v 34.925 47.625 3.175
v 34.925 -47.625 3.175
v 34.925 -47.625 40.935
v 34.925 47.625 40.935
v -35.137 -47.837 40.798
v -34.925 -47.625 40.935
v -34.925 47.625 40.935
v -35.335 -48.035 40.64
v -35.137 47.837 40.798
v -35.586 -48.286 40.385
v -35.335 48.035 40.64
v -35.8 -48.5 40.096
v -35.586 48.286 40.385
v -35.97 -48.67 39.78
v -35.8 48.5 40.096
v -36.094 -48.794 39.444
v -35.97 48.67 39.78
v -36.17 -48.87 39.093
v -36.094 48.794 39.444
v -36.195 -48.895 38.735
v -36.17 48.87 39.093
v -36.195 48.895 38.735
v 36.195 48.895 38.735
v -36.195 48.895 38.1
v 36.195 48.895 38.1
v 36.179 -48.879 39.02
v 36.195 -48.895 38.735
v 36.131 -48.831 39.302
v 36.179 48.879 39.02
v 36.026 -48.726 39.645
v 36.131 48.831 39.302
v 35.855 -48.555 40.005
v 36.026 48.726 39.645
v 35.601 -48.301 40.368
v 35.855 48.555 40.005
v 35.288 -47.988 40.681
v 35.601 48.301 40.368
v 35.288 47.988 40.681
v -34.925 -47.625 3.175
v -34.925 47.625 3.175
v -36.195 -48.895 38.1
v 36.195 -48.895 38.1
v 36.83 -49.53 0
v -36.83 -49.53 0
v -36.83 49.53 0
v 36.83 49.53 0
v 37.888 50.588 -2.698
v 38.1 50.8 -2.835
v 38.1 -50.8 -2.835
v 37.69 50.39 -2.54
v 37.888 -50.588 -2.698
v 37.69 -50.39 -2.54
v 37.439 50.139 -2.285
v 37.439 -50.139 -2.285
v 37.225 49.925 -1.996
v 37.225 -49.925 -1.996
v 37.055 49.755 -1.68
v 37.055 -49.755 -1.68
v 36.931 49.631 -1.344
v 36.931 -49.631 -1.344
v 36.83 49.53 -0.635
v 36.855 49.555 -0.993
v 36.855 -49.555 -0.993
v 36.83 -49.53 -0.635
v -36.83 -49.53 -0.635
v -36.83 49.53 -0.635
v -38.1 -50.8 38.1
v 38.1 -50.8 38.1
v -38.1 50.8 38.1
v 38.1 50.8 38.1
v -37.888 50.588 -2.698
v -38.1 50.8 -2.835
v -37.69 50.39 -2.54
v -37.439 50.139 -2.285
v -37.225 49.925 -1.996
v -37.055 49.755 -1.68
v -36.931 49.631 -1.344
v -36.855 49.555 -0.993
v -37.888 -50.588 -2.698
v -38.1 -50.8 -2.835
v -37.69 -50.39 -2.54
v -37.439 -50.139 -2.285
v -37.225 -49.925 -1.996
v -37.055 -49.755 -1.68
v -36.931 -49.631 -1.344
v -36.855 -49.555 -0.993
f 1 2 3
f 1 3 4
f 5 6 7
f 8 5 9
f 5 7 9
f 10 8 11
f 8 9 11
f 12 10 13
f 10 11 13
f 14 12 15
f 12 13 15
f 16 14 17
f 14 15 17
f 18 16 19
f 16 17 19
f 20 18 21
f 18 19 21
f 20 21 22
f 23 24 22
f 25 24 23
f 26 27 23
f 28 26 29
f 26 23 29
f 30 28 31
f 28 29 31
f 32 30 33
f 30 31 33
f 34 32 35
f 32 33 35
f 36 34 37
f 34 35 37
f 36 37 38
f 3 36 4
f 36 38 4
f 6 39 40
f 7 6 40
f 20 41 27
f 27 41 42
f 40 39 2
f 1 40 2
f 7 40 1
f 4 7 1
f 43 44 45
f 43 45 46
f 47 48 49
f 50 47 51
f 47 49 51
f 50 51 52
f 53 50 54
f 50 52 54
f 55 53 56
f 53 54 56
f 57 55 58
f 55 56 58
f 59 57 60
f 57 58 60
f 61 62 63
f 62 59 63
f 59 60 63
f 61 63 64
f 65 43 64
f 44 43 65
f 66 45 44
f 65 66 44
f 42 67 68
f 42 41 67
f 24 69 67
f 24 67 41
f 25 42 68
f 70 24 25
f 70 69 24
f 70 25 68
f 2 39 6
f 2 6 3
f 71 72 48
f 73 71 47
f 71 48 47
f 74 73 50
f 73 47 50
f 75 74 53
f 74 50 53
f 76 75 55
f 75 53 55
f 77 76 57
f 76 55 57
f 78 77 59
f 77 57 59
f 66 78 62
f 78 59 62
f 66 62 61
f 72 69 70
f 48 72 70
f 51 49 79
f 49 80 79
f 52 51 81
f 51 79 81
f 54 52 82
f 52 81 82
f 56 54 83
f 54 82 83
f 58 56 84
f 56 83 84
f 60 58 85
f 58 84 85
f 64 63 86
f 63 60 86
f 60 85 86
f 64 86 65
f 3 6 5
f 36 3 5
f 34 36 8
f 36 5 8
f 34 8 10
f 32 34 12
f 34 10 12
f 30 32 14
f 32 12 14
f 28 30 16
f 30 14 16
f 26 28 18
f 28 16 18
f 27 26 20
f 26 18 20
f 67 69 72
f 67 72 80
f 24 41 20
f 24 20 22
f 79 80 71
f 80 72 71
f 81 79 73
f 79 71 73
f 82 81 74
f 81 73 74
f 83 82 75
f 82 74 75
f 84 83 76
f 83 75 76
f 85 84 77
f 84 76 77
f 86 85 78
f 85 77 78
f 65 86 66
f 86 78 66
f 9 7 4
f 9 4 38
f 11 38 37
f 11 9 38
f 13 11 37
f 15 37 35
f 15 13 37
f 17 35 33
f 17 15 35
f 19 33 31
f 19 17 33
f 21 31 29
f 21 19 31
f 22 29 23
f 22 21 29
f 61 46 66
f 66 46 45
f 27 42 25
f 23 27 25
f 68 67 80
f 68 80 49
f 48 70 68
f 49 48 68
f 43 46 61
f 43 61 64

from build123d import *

# Parameters (mm, degrees)
F0_W         = 76.2
F0_H         = 101.6
F1_DEPTH     = 38.1
F2_W         = 69.85
F2_H         = 95.25
F3_DEPTH     = 34.925
F4_W         = 72.39
F4_H         = 97.79
F4_W_2       = 69.85
F4_H_2       = 95.25
F5_DEPTH     = 3.175
F6_W         = 76.2
F6_H         = 101.6
F6_W_2       = 73.66
F6_H_2       = 99.06
F7_DEPTH     = 3.175
F8_T1_DEPTH  = 110.49
F8_T3_DEPTH  = 85.09
F8_T5_DEPTH  = 99.06
F8_T7_DEPTH  = 73.66
F8_T13_DEPTH = 105.41
F8_T19_DEPTH = 80.01
F8_T28_DEPTH = 105.41
F8_T34_DEPTH = 80.01
F8_T43_DEPTH = 80.01
F8_T49_DEPTH = 105.41
F8_T58_DEPTH = 105.41
F8_T64_DEPTH = 80.01


# Not quite as in the source:
# - a fillet or chamfer that OpenCascade refuses, or shapes differently, is made with other operations: its cross-section is extruded or revolved along the edge and cut away or added


with BuildPart() as f1:
    # F0 (on Top) → F1 (new body)
    with BuildSketch(Plane.XY):
        Rectangle(F0_W, F0_H)
    extrude(amount=F1_DEPTH)

    # F2 (on face) → F3 (cut)
    with BuildSketch(Plane.XY.offset(38.1)):
        Rectangle(F2_W, F2_H)
    extrude(amount=-F3_DEPTH, mode=Mode.SUBTRACT)

    # F4 (on face) → F5 (join)
    with BuildSketch(Plane.XY.offset(38.1)):
        Rectangle(F4_W, F4_H)
        Rectangle(F4_W_2, F4_H_2, mode=Mode.SUBTRACT)
    extrude(amount=F5_DEPTH)

    # F6 (on face) → F7 (join)
    with BuildSketch(Plane(origin=(0, 0, 0), x_dir=(1, 0, 0), z_dir=(0, 0, -1))):
        Rectangle(F6_W, F6_H)
        Rectangle(F6_W_2, F6_H_2, mode=Mode.SUBTRACT)
    extrude(amount=F7_DEPTH)

    # F8: fillet of radius 2.54 on 8 edges, made by hand

    # F8_s2 → F8_t1 (cut)
    with BuildSketch(Plane.XZ.offset(-55.245)):
        with BuildLine():
            ThreePointArc((-33.655, 41.275), (-35.4510512242, 40.5310512242), (-36.195, 38.735))
            Line((-36.195, 38.735), (-36.195, 41.275))
            Line((-36.195, 41.275), (-33.655, 41.275))
        make_face()
        with BuildLine():
            ThreePointArc((36.195, 38.735), (35.4510512242, 40.5310512242), (33.655, 41.275))
            Line((33.655, 41.275), (36.195, 41.275))
            Line((36.195, 41.275), (36.195, 38.735))
        make_face()
    extrude(amount=F8_T1_DEPTH, mode=Mode.SUBTRACT)

    # F8_s4 → F8_t3 (cut)
    with BuildSketch(Plane.YZ.offset(-42.545)):
        with BuildLine():
            ThreePointArc((-46.355, 41.275), (-48.1510512242, 40.5310512242), (-48.895, 38.735))
            Line((-48.895, 38.735), (-48.895, 41.275))
            Line((-48.895, 41.275), (-46.355, 41.275))
        make_face()
        with BuildLine():
            ThreePointArc((46.355, 41.275), (48.1510512242, 40.5310512242), (48.895, 38.735))
            Line((48.895, 38.735), (48.895, 41.275))
            Line((48.895, 41.275), (46.355, 41.275))
        make_face()
    extrude(amount=F8_T3_DEPTH, mode=Mode.SUBTRACT)

    # F8_s6 → F8_t5 (cut)
    with BuildSketch(Plane.XZ.offset(-49.53)):
        with BuildLine():
            ThreePointArc((-39.37, -3.175), (-37.5739487758, -2.4310512242), (-36.83, -0.635))
            Line((-36.83, -0.635), (-36.83, -3.175))
            Line((-36.83, -3.175), (-39.37, -3.175))
        make_face()
        with BuildLine():
            ThreePointArc((39.37, -3.175), (37.5739487758, -2.4310512242), (36.83, -0.635))
            Line((36.83, -0.635), (36.83, -3.175))
            Line((36.83, -3.175), (39.37, -3.175))
        make_face()
    extrude(amount=F8_T5_DEPTH, mode=Mode.SUBTRACT)

    # F8_s8 → F8_t7 (cut)
    with BuildSketch(Plane.YZ.offset(-36.83)):
        with BuildLine():
            ThreePointArc((-52.07, -3.175), (-50.2739487758, -2.4310512242), (-49.53, -0.635))
            Line((-49.53, -0.635), (-49.53, -3.175))
            Line((-49.53, -3.175), (-52.07, -3.175))
        make_face()
        with BuildLine():
            ThreePointArc((52.07, -3.175), (50.2739487758, -2.4310512242), (49.53, -0.635))
            Line((49.53, -0.635), (49.53, -3.175))
            Line((49.53, -3.175), (52.07, -3.175))
        make_face()
    extrude(amount=F8_T7_DEPTH, mode=Mode.SUBTRACT)


with BuildPart() as f8_tool11:
    # F8_s12 → F8_t13 (new body)
    with BuildSketch(Plane.XZ.offset(-55.88)):
        with BuildLine():
            ThreePointArc((-39.37, -3.175), (-37.5739487758, -2.4310512242), (-36.83, -0.635))
            Line((-36.83, -0.635), (-36.83, -3.175))
            Line((-36.83, -3.175), (-39.37, -3.175))
        make_face()
    extrude(amount=F8_T13_DEPTH)

    split(bisect_by=Plane.XZ.offset(-49.53), keep=Keep.BOTTOM)

    split(bisect_by=Plane.YZ.offset(-38.1), keep=Keep.TOP)

    split(bisect_by=Plane.XZ.offset(-50.8), keep=Keep.TOP)


with BuildPart() as f8_tool17:
    # F8_s18 → F8_t19 (new body)
    with BuildSketch(Plane.YZ.offset(36.83)):
        with BuildLine():
            ThreePointArc((52.07, -3.175), (50.2739487758, -2.4310512242), (49.53, -0.635))
            Line((49.53, -0.635), (49.53, -3.175))
            Line((49.53, -3.175), (52.07, -3.175))
        make_face()
    extrude(amount=-F8_T19_DEPTH)

    split(bisect_by=Plane.YZ.offset(-36.83), keep=Keep.BOTTOM)

    split(bisect_by=Plane.YZ.offset(-38.1), keep=Keep.TOP)

    split(bisect_by=Plane.XZ.offset(-50.8), keep=Keep.TOP)


with BuildPart() as f8_tool11_1:
    add(f8_tool11.part)

    # F8_t23: intersect F8_tool17
    add(f8_tool17.part, mode=Mode.INTERSECT)


with BuildPart() as f1_1:
    add(f1.part)

    # F8_t9: cut F8_tool11
    add(f8_tool11_1.part, mode=Mode.SUBTRACT)


with BuildPart() as f8_tool26:
    # F8_s27 → F8_t28 (new body)
    with BuildSketch(Plane.XZ.offset(-49.53)):
        with BuildLine():
            ThreePointArc((-39.37, -3.175), (-37.5739487758, -2.4310512242), (-36.83, -0.635))
            Line((-36.83, -0.635), (-36.83, -3.175))
            Line((-36.83, -3.175), (-39.37, -3.175))
        make_face()
    extrude(amount=F8_T28_DEPTH)

    split(bisect_by=Plane.XZ.offset(49.53), keep=Keep.TOP)

    split(bisect_by=Plane.YZ.offset(-38.1), keep=Keep.TOP)

    split(bisect_by=Plane.XZ.offset(50.8), keep=Keep.BOTTOM)


with BuildPart() as f8_tool32:
    # F8_s33 → F8_t34 (new body)
    with BuildSketch(Plane.YZ.offset(-43.18)):
        with BuildLine():
            ThreePointArc((-52.07, -3.175), (-50.2739487758, -2.4310512242), (-49.53, -0.635))
            Line((-49.53, -0.635), (-49.53, -3.175))
            Line((-49.53, -3.175), (-52.07, -3.175))
        make_face()
    extrude(amount=F8_T34_DEPTH)

    split(bisect_by=Plane.YZ.offset(-36.83), keep=Keep.BOTTOM)

    split(bisect_by=Plane.YZ.offset(-38.1), keep=Keep.TOP)

    split(bisect_by=Plane.XZ.offset(50.8), keep=Keep.BOTTOM)


with BuildPart() as f8_tool26_1:
    add(f8_tool26.part)

    # F8_t38: intersect F8_tool32
    add(f8_tool32.part, mode=Mode.INTERSECT)


with BuildPart() as f1_2:
    add(f1_1.part)

    # F8_t24: cut F8_tool26
    add(f8_tool26_1.part, mode=Mode.SUBTRACT)


with BuildPart() as f8_tool41:
    # F8_s42 → F8_t43 (new body)
    with BuildSketch(Plane.YZ.offset(-36.83)):
        with BuildLine():
            ThreePointArc((-52.07, -3.175), (-50.2739487758, -2.4310512242), (-49.53, -0.635))
            Line((-49.53, -0.635), (-49.53, -3.175))
            Line((-49.53, -3.175), (-52.07, -3.175))
        make_face()
    extrude(amount=F8_T43_DEPTH)

    split(bisect_by=Plane.YZ.offset(38.1), keep=Keep.BOTTOM)

    split(bisect_by=Plane.YZ.offset(36.83), keep=Keep.TOP)

    split(bisect_by=Plane.XZ.offset(50.8), keep=Keep.BOTTOM)


with BuildPart() as f8_tool47:
    # F8_s48 → F8_t49 (new body)
    with BuildSketch(Plane.XZ.offset(55.88)):
        with BuildLine():
            ThreePointArc((39.37, -3.175), (37.5739487758, -2.4310512242), (36.83, -0.635))
            Line((36.83, -0.635), (36.83, -3.175))
            Line((36.83, -3.175), (39.37, -3.175))
        make_face()
    extrude(amount=-F8_T49_DEPTH)

    split(bisect_by=Plane.YZ.offset(38.1), keep=Keep.BOTTOM)

    split(bisect_by=Plane.XZ.offset(49.53), keep=Keep.TOP)

    split(bisect_by=Plane.XZ.offset(50.8), keep=Keep.BOTTOM)


with BuildPart() as f8_tool41_1:
    add(f8_tool41.part)

    # F8_t53: intersect F8_tool47
    add(f8_tool47.part, mode=Mode.INTERSECT)


with BuildPart() as f1_3:
    add(f1_2.part)

    # F8_t39: cut F8_tool41
    add(f8_tool41_1.part, mode=Mode.SUBTRACT)


with BuildPart() as f8_tool56:
    # F8_s57 → F8_t58 (new body)
    with BuildSketch(Plane.XZ.offset(49.53)):
        with BuildLine():
            ThreePointArc((39.37, -3.175), (37.5739487758, -2.4310512242), (36.83, -0.635))
            Line((36.83, -0.635), (36.83, -3.175))
            Line((36.83, -3.175), (39.37, -3.175))
        make_face()
    extrude(amount=-F8_T58_DEPTH)

    split(bisect_by=Plane.YZ.offset(38.1), keep=Keep.BOTTOM)

    split(bisect_by=Plane.XZ.offset(-49.53), keep=Keep.BOTTOM)

    split(bisect_by=Plane.XZ.offset(-50.8), keep=Keep.TOP)


with BuildPart() as f8_tool62:
    # F8_s63 → F8_t64 (new body)
    with BuildSketch(Plane.YZ.offset(43.18)):
        with BuildLine():
            ThreePointArc((52.07, -3.175), (50.2739487758, -2.4310512242), (49.53, -0.635))
            Line((49.53, -0.635), (49.53, -3.175))
            Line((49.53, -3.175), (52.07, -3.175))
        make_face()
    extrude(amount=-F8_T64_DEPTH)

    split(bisect_by=Plane.YZ.offset(38.1), keep=Keep.BOTTOM)

    split(bisect_by=Plane.YZ.offset(36.83), keep=Keep.TOP)

    split(bisect_by=Plane.XZ.offset(-50.8), keep=Keep.TOP)


with BuildPart() as f8_tool56_1:
    add(f8_tool56.part)

    # F8_t68: intersect F8_tool62
    add(f8_tool62.part, mode=Mode.INTERSECT)


with BuildPart() as f1_4:
    add(f1_3.part)

    # F8_t54: cut F8_tool56
    add(f8_tool56_1.part, mode=Mode.SUBTRACT)


solid = f1_4.part
